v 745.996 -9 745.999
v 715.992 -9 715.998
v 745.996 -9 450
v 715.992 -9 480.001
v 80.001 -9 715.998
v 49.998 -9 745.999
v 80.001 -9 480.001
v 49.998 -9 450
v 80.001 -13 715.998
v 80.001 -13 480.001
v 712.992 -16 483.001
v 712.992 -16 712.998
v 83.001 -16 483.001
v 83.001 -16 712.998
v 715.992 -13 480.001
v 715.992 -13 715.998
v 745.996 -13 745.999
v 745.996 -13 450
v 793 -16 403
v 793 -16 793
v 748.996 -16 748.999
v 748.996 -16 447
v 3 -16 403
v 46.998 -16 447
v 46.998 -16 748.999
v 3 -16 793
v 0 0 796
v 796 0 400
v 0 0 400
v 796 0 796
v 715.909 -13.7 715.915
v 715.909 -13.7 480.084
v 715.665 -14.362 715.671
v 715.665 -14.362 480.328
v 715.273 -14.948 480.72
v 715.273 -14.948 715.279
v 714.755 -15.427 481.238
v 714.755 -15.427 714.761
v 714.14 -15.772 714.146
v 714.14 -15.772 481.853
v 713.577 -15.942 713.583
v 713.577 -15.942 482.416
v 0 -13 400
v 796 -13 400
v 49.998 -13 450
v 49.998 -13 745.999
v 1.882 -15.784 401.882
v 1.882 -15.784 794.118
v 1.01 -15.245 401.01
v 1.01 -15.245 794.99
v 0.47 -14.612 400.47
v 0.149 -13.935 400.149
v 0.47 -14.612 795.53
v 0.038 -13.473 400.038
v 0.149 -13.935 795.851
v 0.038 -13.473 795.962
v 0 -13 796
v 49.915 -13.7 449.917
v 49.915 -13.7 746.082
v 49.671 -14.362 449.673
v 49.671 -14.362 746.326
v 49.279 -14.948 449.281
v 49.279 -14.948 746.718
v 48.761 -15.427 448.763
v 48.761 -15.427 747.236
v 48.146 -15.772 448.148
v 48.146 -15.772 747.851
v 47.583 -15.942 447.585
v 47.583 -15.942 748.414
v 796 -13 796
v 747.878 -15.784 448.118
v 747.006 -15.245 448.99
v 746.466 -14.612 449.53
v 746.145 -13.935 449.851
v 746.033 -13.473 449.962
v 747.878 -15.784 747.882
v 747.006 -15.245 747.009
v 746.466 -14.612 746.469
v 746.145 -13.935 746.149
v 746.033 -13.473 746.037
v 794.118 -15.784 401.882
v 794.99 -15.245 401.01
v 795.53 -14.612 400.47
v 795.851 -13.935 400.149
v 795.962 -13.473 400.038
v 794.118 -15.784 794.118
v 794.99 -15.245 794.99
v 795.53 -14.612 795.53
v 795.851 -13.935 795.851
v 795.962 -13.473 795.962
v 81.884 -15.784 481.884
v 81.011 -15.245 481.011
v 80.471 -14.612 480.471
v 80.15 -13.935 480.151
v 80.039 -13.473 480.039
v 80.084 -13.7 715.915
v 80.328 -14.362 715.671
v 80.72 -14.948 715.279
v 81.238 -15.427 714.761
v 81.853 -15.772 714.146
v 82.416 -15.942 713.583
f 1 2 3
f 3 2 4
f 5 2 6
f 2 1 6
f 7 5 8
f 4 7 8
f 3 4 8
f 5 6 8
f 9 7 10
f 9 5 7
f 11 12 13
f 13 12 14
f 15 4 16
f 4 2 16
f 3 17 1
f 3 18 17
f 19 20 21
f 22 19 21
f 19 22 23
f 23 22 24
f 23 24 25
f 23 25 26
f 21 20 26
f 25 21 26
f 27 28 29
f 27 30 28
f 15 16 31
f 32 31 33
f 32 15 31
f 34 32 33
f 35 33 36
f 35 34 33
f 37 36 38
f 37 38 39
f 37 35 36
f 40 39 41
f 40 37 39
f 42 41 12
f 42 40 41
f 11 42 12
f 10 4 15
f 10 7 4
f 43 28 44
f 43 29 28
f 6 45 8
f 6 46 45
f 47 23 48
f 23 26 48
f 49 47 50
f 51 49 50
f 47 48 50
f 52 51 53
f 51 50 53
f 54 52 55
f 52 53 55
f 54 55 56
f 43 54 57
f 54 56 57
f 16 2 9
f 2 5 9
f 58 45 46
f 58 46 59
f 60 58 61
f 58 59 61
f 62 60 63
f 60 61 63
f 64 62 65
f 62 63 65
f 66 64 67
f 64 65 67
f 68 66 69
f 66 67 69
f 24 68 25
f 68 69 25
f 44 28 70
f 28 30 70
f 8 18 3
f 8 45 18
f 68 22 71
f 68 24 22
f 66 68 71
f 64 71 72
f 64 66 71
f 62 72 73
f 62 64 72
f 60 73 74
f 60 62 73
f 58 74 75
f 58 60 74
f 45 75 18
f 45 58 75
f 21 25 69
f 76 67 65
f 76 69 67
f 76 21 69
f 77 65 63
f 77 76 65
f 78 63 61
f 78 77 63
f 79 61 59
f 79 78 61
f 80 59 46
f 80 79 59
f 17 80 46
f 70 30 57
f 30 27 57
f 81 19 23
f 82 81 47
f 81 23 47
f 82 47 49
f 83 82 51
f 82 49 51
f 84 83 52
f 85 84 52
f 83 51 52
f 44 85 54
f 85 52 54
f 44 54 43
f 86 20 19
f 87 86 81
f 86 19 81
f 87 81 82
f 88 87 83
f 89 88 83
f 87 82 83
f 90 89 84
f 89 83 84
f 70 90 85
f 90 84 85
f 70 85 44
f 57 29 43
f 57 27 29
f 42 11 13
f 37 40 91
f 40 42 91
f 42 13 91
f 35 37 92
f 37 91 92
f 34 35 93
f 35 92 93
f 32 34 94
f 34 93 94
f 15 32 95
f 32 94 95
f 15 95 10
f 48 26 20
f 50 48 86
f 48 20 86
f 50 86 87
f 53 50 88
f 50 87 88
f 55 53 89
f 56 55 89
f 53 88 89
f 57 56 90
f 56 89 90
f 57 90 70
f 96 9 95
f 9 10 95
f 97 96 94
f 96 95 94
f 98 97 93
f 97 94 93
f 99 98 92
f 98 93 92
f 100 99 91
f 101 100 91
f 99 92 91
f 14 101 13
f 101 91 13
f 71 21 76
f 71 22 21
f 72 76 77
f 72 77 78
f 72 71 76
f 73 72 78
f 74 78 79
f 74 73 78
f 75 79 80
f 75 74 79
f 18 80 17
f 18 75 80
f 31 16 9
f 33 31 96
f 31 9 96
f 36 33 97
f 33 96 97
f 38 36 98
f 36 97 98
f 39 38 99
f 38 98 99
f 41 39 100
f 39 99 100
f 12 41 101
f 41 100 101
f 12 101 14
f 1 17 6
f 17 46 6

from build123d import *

# Parameters (mm, degrees)
F0_W      = 44.656470418
F0_H      = 33.8078811765
F1_DEPTH  = 16
F2_DEPTH  = 796
F3_DEPTH  = 196
F4_W      = 68.9578056335
F4_H      = 493.6993122101
F5_DEPTH  = 7
F6_DEPTH  = 9.7
F7_DEPTH  = 99.33
F8_DEPTH  = 99.33
F9_DEPTH  = 17.34
F10_DEPTH = 102.97
F11_W     = 35.2807044983
F11_H     = 492.0964837074
F12_DEPTH = 7
F13_DEPTH = 37.27
F14_DEPTH = 6.58
F15_DEPTH = 106.63
F16_DEPTH = 5.87
F17_DEPTH = 200
F18_DEPTH = 200
F19_DEPTH = 200
F20_DEPTH = 200
F21_DEPTH = 200
F22_DEPTH = 200
F23_DEPTH = 600
F24_DEPTH = 600
F25_DEPTH = 600
F26_DEPTH = 200
F27_DEPTH = 200
F28_DEPTH = 200
F29_DEPTH = 200
F30_DEPTH = 200
F31_DEPTH = 200
F32_DEPTH = 200
F33_DEPTH = 200
F34_DEPTH = 200
F35_DEPTH = 200
F36_DEPTH = 200
F37_DEPTH = 200
F38_R     = 3


with BuildPart() as f1:
    # F0 (on Front) → F1 (new body)
    with BuildSketch(Plane.XZ):
        with Locations((22.328235209, 16.9039405882)):
            Rectangle(F0_W, F0_H)
    extrude(amount=F1_DEPTH)

    # F2 (add): a face of the model
    f2_faces = [f1.faces().sort_by_distance(p)[0] for p in [
        (22.328235209, -8, 0),
    ]]
    extrude(f2_faces, amount=-F2_DEPTH)

    # F3 (add): a face of the model
    f3_faces = [f1.faces().sort_by_distance(p)[0] for p in [
        (0, -8, 398),
    ]]
    extrude(f3_faces, amount=-F3_DEPTH)

    # F4 (on face) → F5 (cut)
    with BuildSketch(Plane.XZ.offset(16)):
        with Locations((94.1769480705, 399.8196721077)):
            Rectangle(F4_W, F4_H)
    extrude(amount=-F5_DEPTH, mode=Mode.SUBTRACT)

    # F6 (cut): a face of the model
    f6_faces = [f1.faces().sort_by_distance(p)[0] for p in [
        (59.6980452538, -12.5, 399.8196721077),
    ]]
    extrude(f6_faces, amount=-F6_DEPTH, mode=Mode.SUBTRACT)

    # F7 (add): a face of the model
    f7_faces = [f1.faces().sort_by_distance(p)[0] for p in [
        (89.3269480705, -12.5, 646.6693282127),
    ]]
    extrude(f7_faces, amount=-F7_DEPTH)

    # F8 (cut): a face of the model
    f8_faces = [f1.faces().sort_by_distance(p)[0] for p in [
        (89.3269480705, -12.5, 646.6693282127),
    ]]
    extrude(f8_faces, amount=-F8_DEPTH, mode=Mode.SUBTRACT)

    # F9 (cut): a face of the model
    f9_faces = [f1.faces().sort_by_distance(p)[0] for p in [
        (128.6558508873, -12.5, 449.4846721077),
    ]]
    extrude(f9_faces, amount=-F9_DEPTH, mode=Mode.SUBTRACT)

    # F10 (cut): a face of the model
    f10_faces = [f1.faces().sort_by_distance(p)[0] for p in [
        (97.9969480705, -12.5, 152.9700160027),
    ]]
    extrude(f10_faces, amount=-F10_DEPTH, mode=Mode.SUBTRACT)

    # F11 (on face) → F12 (join)
    with BuildSketch(Plane.XZ.offset(9)):
        with Locations((91.7714834213, 432.6795041561)):
            Rectangle(F11_W, F11_H)
    extrude(amount=F12_DEPTH)

    # F13 (add): a face of the model
    f13_faces = [f1.faces().sort_by_distance(p)[0] for p in [
        (91.7714834213, -12.5, 678.7277460098),
    ]]
    extrude(f13_faces, amount=F13_DEPTH)

    # F14 (add): a face of the model
    f14_faces = [f1.faces().sort_by_distance(p)[0] for p in [
        (109.4118356705, -12.5, 451.3145041561),
    ]]
    extrude(f14_faces, amount=F14_DEPTH)

    # F15 (add): a face of the model
    f15_faces = [f1.faces().sort_by_distance(p)[0] for p in [
        (95.0614834213, -12.5, 186.6312623024),
    ]]
    extrude(f15_faces, amount=F15_DEPTH)

    # F16 (cut): a face of the model
    f16_faces = [f1.faces().sort_by_distance(p)[0] for p in [
        (74.1311311722, -12.5, 397.9995041561),
    ]]
    extrude(f16_faces, amount=-F16_DEPTH, mode=Mode.SUBTRACT)

    # F17 (add): a face of the model
    f17_faces = [f1.faces().sort_by_distance(p)[0] for p in [
        (196, -8, 398),
    ]]
    extrude(f17_faces, amount=F17_DEPTH)

    # F18 (cut): a face of the model
    f18_faces = [f1.faces().sort_by_distance(p)[0] for p in [
        (145.9958508873, -12.5, 397.9996721077),
    ]]
    extrude(f18_faces, amount=-F18_DEPTH, mode=Mode.SUBTRACT)

    # F19 (add): a face of the model
    f19_faces = [f1.faces().sort_by_distance(p)[0] for p in [
        (115.9918356705, -12.5, 397.9995041561),
    ]]
    extrude(f19_faces, amount=F19_DEPTH)

    # F20 (add): a face of the model
    f20_faces = [f1.faces().sort_by_distance(p)[0] for p in [
        (396, -8, 398),
    ]]
    extrude(f20_faces, amount=F20_DEPTH)

    # F21 (cut): a face of the model
    f21_faces = [f1.faces().sort_by_distance(p)[0] for p in [
        (345.9958508873, -12.5, 397.9996721077),
    ]]
    extrude(f21_faces, amount=-F21_DEPTH, mode=Mode.SUBTRACT)

    # F22 (add): a face of the model
    f22_faces = [f1.faces().sort_by_distance(p)[0] for p in [
        (315.9918356705, -12.5, 397.9995041561),
    ]]
    extrude(f22_faces, amount=F22_DEPTH)

    # F23 (cut): a face of the model
    f23_faces = [f1.faces().sort_by_distance(p)[0] for p in [
        (297.9964834213, -12.5, 80.0012623024),
    ]]
    extrude(f23_faces, amount=-F23_DEPTH, mode=Mode.SUBTRACT)

    # F24 (add): a face of the model
    f24_faces = [f1.faces().sort_by_distance(p)[0] for p in [
        (297.9969480705, -12.5, 50.0000160027),
    ]]
    extrude(f24_faces, amount=F24_DEPTH)

    # F25 (cut): a face of the model
    f25_faces = [f1.faces().sort_by_distance(p)[0] for p in [
        (298, -8, 0),
    ]]
    extrude(f25_faces, amount=-F25_DEPTH, mode=Mode.SUBTRACT)

    # F26 (add): a face of the model
    f26_faces = [f1.faces().sort_by_distance(p)[0] for p in [
        (298, -8, 600),
    ]]
    extrude(f26_faces, amount=F26_DEPTH)

    # F27 (cut): a face of the model
    f27_faces = [f1.faces().sort_by_distance(p)[0] for p in [
        (297.9969480705, -12.5, 650.0000160027),
    ]]
    extrude(f27_faces, amount=-F27_DEPTH, mode=Mode.SUBTRACT)

    # F28 (add): a face of the model
    f28_faces = [f1.faces().sort_by_distance(p)[0] for p in [
        (297.9964834213, -12.5, 680.0012623024),
    ]]
    extrude(f28_faces, amount=F28_DEPTH)

    # F29 (add): a face of the model
    f29_faces = [f1.faces().sort_by_distance(p)[0] for p in [
        (596, -8, 598),
    ]]
    extrude(f29_faces, amount=F29_DEPTH)

    # F30 (cut): a face of the model
    f30_faces = [f1.faces().sort_by_distance(p)[0] for p in [
        (545.9958508873, -12.5, 597.9996721077),
    ]]
    extrude(f30_faces, amount=-F30_DEPTH, mode=Mode.SUBTRACT)

    # F31 (add): a face of the model
    f31_faces = [f1.faces().sort_by_distance(p)[0] for p in [
        (515.9918356705, -12.5, 597.9995041561),
    ]]
    extrude(f31_faces, amount=F31_DEPTH)

    # F32 (cut): a face of the model
    f32_faces = [f1.faces().sort_by_distance(p)[0] for p in [
        (397.9964834213, -12.5, 480.0012623024),
    ]]
    extrude(f32_faces, amount=-F32_DEPTH, mode=Mode.SUBTRACT)

    # F33 (add): a face of the model
    f33_faces = [f1.faces().sort_by_distance(p)[0] for p in [
        (397.9969480705, -12.5, 450.0000160027),
    ]]
    extrude(f33_faces, amount=F33_DEPTH)

    # F34 (cut): a face of the model
    f34_faces = [f1.faces().sort_by_distance(p)[0] for p in [
        (398, -8, 400),
    ]]
    extrude(f34_faces, amount=-F34_DEPTH, mode=Mode.SUBTRACT)

    # F35 (add): a face of the model
    f35_faces = [f1.faces().sort_by_distance(p)[0] for p in [
        (398, -8, 600),
    ]]
    extrude(f35_faces, amount=F35_DEPTH)

    # F36 (cut): a face of the model
    f36_faces = [f1.faces().sort_by_distance(p)[0] for p in [
        (397.9969480705, -12.5, 650.0000160027),
    ]]
    extrude(f36_faces, amount=-F36_DEPTH, mode=Mode.SUBTRACT)

    # F37 (add): a face of the model
    f37_faces = [f1.faces().sort_by_distance(p)[0] for p in [
        (397.9964834213, -12.5, 680.0012623024),
    ]]
    extrude(f37_faces, amount=F37_DEPTH)

    # F38
    f38_edges = [f1.edges().sort_by_distance(p)[0] for p in [
        (397.996483, -16, 715.997746),
        (715.991836, -16, 597.999504),
        (397.996483, -16, 480.001262),
        (80.001131, -16, 597.999504),
        (0, -16, 598),
        (398, -16, 400),
        (796, -16, 598),
        (398, -16, 796),
        (49.998045, -16, 597.999672),
        (397.996948, -16, 745.999328),
        (745.995851, -16, 597.999672),
        (397.996948, -16, 450.000016),
    ]]
    fillet(f38_edges, radius=F38_R)


solid = f1.part
